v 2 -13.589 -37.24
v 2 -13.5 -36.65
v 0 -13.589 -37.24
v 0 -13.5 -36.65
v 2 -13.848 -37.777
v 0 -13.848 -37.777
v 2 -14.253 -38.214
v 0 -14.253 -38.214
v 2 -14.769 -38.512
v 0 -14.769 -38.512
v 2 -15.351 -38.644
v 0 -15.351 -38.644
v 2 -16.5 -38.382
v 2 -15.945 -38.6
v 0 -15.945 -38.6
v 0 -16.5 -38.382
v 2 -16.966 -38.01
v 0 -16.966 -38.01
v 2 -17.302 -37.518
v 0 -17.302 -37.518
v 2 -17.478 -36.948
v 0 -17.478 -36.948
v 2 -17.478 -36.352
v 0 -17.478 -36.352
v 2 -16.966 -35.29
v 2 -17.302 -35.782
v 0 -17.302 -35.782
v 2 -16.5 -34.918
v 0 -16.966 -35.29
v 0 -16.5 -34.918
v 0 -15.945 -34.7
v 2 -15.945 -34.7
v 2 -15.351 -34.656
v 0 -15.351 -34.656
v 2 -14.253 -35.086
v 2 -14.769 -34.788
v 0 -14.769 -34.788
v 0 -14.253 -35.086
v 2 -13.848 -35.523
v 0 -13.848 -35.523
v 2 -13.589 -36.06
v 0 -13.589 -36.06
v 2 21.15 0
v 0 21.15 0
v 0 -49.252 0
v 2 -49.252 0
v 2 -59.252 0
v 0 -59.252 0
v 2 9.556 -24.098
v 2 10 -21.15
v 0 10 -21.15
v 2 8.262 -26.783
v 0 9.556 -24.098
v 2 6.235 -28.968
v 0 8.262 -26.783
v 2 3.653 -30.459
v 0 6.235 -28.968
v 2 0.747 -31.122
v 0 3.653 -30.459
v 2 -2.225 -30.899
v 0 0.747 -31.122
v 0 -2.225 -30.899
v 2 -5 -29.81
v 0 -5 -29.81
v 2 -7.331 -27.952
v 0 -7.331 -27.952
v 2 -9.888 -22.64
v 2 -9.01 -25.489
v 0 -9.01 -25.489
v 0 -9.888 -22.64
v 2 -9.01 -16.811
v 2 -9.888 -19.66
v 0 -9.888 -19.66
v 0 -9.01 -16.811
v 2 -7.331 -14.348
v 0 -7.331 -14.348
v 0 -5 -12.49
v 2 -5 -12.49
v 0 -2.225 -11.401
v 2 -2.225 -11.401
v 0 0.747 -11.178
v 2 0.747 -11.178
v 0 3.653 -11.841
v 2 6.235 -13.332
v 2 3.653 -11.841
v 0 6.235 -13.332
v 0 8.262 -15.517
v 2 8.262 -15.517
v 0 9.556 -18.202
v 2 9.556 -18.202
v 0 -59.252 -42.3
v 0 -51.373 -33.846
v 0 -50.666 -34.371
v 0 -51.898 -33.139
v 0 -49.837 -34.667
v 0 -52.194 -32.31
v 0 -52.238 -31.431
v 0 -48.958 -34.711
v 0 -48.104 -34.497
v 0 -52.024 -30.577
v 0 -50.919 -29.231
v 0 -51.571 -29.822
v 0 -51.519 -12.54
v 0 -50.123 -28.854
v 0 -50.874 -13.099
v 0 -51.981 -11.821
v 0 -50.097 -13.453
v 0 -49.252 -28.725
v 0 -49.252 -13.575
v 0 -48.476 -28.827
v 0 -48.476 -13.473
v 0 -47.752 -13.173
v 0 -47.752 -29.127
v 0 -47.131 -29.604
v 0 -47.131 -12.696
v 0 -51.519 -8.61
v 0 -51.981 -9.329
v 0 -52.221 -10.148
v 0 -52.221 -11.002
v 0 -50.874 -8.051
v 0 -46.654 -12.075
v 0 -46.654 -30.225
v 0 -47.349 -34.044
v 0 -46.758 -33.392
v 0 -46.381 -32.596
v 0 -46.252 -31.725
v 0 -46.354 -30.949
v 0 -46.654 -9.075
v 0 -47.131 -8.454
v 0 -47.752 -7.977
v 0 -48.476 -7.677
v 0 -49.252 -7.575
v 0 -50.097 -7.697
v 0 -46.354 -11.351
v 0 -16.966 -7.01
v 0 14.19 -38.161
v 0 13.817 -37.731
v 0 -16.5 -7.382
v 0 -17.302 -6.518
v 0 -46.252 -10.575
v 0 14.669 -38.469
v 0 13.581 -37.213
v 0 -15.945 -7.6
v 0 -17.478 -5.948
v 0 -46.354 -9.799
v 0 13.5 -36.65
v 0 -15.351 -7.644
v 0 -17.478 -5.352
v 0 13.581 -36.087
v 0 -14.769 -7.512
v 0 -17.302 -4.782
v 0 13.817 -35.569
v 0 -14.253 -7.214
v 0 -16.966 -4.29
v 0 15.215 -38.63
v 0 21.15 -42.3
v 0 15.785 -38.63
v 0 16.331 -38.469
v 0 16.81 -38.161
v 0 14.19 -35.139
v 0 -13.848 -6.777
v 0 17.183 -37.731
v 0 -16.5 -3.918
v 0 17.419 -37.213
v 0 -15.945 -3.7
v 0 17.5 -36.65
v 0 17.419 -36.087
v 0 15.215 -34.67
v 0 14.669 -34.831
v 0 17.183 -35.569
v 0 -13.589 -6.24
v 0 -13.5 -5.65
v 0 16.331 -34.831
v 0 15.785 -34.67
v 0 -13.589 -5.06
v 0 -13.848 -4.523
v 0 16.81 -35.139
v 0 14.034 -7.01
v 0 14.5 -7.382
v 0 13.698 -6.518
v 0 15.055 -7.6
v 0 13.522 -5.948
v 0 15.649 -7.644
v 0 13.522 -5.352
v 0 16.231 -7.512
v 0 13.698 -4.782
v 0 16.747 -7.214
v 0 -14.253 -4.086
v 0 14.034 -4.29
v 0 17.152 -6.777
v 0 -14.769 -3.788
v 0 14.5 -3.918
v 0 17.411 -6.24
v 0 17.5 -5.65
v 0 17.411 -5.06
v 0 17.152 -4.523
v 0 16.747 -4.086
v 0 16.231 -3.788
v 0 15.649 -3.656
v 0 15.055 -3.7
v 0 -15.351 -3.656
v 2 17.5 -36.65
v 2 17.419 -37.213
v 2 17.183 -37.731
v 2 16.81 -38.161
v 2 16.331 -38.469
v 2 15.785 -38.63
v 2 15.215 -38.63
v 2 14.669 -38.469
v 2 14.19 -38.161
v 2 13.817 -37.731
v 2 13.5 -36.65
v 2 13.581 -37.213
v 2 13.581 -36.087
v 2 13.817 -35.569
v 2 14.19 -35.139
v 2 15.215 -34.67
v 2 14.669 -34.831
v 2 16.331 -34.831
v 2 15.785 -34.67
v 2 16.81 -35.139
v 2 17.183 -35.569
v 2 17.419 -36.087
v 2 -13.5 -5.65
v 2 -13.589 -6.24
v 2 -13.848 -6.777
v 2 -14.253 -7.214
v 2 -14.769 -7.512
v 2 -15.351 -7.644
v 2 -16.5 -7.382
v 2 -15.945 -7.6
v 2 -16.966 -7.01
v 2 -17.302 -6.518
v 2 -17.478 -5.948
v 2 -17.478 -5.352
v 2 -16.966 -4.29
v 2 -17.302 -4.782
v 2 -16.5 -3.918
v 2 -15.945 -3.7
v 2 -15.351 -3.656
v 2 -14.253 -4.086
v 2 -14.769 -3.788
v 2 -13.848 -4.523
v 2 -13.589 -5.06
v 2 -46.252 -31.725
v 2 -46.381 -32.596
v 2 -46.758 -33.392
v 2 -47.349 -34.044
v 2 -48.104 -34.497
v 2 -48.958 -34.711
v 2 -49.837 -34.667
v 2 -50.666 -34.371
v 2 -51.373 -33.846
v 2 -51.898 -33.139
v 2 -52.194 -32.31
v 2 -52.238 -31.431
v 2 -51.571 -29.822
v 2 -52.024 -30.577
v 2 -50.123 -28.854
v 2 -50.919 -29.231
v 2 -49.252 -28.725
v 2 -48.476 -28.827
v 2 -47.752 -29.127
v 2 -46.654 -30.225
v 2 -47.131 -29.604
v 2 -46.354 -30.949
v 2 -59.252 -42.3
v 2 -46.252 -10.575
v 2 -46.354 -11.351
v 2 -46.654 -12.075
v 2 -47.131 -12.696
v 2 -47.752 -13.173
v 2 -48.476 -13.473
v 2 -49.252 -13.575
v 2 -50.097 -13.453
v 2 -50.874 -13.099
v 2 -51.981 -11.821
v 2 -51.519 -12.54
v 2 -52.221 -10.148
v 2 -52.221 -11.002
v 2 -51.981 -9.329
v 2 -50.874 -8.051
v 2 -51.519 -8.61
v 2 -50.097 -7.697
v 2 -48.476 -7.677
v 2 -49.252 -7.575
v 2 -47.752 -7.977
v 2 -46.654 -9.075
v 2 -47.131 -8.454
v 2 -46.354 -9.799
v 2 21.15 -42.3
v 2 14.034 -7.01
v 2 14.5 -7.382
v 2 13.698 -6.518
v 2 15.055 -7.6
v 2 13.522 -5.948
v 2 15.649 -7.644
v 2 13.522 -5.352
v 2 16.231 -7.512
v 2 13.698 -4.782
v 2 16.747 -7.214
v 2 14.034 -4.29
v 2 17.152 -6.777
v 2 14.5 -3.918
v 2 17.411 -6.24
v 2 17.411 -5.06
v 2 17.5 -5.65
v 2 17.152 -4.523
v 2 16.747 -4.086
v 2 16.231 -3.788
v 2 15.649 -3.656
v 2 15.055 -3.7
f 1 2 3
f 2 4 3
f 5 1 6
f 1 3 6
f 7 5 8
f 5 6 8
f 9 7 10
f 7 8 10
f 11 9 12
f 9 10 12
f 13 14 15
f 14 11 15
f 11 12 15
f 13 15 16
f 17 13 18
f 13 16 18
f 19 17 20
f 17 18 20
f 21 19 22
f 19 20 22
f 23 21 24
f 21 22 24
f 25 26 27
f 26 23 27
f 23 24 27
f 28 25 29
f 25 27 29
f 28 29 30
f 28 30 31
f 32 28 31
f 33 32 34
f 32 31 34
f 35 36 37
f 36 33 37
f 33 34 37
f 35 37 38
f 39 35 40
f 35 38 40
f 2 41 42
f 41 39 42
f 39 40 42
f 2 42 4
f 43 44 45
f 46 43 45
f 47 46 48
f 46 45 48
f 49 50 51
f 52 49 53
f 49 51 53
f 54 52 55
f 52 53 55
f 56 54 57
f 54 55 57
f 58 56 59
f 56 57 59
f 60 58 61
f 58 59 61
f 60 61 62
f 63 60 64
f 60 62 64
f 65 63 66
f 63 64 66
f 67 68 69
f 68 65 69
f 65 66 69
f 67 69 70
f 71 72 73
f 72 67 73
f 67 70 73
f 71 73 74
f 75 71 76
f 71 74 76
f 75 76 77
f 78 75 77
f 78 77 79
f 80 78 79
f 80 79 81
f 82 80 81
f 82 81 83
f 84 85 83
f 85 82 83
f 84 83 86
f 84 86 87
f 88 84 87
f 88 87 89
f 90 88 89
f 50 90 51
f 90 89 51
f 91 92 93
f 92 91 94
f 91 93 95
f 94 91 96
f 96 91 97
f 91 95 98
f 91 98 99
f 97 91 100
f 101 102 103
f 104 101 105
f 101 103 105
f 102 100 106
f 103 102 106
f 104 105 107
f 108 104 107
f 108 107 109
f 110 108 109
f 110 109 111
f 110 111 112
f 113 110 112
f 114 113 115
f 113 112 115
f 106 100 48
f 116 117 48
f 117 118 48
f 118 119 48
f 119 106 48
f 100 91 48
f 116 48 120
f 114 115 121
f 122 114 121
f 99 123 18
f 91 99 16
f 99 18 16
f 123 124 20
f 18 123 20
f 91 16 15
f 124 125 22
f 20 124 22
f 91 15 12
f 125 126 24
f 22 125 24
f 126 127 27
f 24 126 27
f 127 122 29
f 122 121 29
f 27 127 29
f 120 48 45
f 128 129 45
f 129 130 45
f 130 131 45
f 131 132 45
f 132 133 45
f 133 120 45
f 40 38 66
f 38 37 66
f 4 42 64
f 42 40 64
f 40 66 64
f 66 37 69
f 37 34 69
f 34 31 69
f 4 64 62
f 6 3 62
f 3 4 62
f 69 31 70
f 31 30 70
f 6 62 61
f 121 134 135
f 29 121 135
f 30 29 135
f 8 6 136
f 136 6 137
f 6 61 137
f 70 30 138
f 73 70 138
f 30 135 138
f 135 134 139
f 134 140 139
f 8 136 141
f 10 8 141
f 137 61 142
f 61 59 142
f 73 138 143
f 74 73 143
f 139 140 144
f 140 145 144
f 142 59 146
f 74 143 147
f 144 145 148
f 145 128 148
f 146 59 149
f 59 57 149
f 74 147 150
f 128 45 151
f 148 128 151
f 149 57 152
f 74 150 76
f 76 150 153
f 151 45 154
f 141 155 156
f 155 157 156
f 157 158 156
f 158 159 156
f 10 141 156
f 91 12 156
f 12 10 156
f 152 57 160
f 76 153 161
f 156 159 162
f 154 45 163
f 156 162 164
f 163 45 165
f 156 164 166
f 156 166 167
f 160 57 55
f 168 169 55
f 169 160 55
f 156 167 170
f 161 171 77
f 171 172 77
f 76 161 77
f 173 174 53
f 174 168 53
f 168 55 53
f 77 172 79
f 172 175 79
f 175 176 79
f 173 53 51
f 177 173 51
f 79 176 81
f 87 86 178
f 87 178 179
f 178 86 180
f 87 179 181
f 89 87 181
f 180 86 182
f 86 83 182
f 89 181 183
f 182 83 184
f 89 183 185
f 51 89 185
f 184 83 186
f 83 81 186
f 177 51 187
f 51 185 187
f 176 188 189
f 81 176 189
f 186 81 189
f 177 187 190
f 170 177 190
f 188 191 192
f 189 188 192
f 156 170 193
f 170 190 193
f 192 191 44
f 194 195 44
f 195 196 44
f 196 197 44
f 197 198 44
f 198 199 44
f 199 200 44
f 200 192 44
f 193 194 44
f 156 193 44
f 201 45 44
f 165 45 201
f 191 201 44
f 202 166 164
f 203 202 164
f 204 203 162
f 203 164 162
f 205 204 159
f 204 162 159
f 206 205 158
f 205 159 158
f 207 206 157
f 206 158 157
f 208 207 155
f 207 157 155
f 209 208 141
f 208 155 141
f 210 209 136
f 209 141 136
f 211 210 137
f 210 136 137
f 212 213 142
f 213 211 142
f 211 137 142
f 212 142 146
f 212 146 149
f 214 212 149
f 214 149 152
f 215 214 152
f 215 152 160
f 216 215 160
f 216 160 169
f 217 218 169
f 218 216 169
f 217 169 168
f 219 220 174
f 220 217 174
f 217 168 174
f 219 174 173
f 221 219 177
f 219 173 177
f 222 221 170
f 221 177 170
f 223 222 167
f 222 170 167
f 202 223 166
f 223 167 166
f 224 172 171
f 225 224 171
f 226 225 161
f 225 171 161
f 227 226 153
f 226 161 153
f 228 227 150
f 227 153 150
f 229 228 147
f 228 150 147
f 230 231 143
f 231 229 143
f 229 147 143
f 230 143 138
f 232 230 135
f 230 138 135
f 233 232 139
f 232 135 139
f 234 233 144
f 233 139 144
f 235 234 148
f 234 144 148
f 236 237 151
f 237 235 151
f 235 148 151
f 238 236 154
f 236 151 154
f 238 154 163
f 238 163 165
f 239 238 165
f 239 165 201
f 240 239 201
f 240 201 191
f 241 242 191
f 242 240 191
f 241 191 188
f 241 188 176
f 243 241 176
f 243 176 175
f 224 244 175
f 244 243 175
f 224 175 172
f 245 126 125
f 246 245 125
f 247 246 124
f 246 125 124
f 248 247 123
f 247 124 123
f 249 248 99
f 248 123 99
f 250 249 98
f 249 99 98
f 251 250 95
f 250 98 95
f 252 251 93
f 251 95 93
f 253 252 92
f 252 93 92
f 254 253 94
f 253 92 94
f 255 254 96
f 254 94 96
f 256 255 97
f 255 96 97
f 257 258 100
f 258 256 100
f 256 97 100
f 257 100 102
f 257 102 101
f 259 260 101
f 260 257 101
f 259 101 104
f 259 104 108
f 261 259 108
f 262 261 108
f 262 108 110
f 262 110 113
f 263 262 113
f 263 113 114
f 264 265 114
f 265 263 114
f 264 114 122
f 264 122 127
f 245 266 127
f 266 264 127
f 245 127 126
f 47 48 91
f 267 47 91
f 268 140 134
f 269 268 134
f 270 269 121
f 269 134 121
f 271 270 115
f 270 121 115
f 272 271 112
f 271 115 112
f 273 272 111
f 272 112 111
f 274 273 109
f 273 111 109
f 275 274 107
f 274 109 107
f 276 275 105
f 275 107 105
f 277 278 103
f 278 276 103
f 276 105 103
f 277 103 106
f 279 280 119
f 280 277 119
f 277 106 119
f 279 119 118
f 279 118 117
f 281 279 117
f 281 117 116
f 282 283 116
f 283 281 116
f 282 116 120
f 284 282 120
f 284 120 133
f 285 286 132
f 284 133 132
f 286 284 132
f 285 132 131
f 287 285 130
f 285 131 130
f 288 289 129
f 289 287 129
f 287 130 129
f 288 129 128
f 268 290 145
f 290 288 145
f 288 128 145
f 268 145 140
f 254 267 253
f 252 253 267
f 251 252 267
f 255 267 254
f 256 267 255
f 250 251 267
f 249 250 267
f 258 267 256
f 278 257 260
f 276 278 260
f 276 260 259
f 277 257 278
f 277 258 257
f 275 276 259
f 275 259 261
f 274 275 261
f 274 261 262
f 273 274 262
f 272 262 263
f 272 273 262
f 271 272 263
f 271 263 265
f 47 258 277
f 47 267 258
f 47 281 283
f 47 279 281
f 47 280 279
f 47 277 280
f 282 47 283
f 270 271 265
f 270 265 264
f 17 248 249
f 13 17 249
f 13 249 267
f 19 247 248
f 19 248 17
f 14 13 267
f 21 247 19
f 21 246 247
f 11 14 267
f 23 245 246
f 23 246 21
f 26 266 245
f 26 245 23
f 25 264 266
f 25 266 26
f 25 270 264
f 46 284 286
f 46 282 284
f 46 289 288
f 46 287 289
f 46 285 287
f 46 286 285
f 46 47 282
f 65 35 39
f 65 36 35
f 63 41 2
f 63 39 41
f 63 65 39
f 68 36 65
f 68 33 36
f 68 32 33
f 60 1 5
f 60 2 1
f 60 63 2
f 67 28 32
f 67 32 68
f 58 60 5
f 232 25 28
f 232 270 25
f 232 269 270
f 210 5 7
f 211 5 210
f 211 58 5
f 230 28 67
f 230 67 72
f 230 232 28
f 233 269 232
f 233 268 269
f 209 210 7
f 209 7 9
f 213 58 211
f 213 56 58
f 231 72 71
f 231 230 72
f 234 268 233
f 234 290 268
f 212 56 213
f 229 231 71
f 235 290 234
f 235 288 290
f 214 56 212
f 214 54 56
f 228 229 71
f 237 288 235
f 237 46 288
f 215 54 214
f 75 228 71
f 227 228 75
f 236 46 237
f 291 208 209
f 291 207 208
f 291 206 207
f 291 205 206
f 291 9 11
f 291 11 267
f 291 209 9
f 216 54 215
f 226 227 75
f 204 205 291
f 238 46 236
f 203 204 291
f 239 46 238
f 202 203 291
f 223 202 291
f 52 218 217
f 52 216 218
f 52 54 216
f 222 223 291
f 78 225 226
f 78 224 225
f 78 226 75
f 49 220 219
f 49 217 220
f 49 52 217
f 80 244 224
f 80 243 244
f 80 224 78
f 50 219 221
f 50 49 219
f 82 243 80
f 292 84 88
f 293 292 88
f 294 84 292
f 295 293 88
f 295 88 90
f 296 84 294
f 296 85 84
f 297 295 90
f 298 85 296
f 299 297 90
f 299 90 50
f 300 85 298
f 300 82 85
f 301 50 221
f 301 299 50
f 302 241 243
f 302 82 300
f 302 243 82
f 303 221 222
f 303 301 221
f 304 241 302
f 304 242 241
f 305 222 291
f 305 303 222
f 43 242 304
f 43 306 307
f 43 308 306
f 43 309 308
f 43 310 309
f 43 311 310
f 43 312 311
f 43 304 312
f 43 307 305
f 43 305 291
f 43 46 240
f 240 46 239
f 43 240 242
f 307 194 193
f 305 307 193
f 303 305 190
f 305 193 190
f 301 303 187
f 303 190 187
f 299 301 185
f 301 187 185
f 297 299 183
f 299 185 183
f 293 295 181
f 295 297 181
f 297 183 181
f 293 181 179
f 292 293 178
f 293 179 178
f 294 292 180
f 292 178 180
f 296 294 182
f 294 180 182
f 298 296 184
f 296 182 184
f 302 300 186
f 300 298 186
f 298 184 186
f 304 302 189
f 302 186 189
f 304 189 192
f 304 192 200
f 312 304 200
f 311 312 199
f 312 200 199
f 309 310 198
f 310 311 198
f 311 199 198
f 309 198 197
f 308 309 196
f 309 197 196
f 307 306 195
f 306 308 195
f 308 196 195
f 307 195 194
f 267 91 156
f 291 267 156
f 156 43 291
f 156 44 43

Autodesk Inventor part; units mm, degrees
ref_plane "YZ Plane" through (0, 0, 0) normal (1, 0, 0) x (0, 1, 0)
ref_plane "XZ Plane" through (0, 0, 0) normal (0, 1, 0) x (-1, 0, 0)
ref_plane "XY Plane" through (0, 0, 0) normal (0, 0, 1) x (1, 0, 0)
sketch "Sketch1" plane through (0, 0, 0) normal (1, 0, 0) x (0, 1, 0)
  line L0 (0, 0) -> (-59.252, 0)
  line L1 (-59.252, 0) -> (-59.252, -42.3)
  line L2 (-59.252, -42.3) -> (0, -42.3)
  line L3 (0, -42.3) -> (0, 0)
  line L4 (-59.252, -42.3) -> (-39.252, -42.3)
  line L5 (-39.252, -42.3) -> (-39.252, 0)
  line L6 (-39.252, 0) -> (-59.252, 0)
  line L7 (-59.252, 0) -> (-59.252, -42.3)
  line L8 (-59.252, 0) -> (-49.252, 0)
  line L9 (-49.252, 0) -> (-49.252, -21.15)
  line L10 (-49.252, -21.15) -> (-49.252, -31.725)
  circle A0 centre (-49.252, -31.725) radius 3
  line L11 (-49.252, -21.15) -> (-49.252, -10.575)
  circle A1 centre (-49.252, -10.575) radius 3
  circle A2 centre (0, -21.15) radius 10
  line L12 (0, 0) -> (21.15, 0)
  line L13 (21.15, 0) -> (21.15, -42.3)
  line L14 (21.15, -42.3) -> (0, -42.3)
  line L15 (0, -42.3) -> (0, 0)
  line L16 (0, -21.15) -> (0, -36.65)
  line L17 (0, -36.65) -> (15.5, -36.65)
  circle A3 centre (15.5, -36.65) radius 2
  circle A4 centre (-15.5, -36.65) radius 2
  circle A5 centre (15.5, -5.65) radius 2
  circle A6 centre (-15.5, -5.65) radius 2
  dimension "d1" = 59.252
  dimension "d2" = 42.3
  dimension "d3" = 20
  dimension "d4" = 10
  dimension "d5" = 21.15
  dimension "d6" = 10.575
  dimension "d7" = 6
  dimension "d8" = 10.575
  dimension "d9" = 6
  dimension "d10" = 20
  dimension "d11" = 21.15
  dimension "d12" = 15.5
  dimension "d13" = 15.5
  dimension "d14" = 4
  dimension "d17" = 31
  dimension "d20" = 31
extrude "Extrusion1" add sketch "Sketch1" along normal blind 2 contours L3 A2 L2 L5 L0 | L12 L13 L14 L3 A2 | L5 L2 L1 L0
properties part number "az_rot_mot_holder.iam" material "Aluminum 6061"
